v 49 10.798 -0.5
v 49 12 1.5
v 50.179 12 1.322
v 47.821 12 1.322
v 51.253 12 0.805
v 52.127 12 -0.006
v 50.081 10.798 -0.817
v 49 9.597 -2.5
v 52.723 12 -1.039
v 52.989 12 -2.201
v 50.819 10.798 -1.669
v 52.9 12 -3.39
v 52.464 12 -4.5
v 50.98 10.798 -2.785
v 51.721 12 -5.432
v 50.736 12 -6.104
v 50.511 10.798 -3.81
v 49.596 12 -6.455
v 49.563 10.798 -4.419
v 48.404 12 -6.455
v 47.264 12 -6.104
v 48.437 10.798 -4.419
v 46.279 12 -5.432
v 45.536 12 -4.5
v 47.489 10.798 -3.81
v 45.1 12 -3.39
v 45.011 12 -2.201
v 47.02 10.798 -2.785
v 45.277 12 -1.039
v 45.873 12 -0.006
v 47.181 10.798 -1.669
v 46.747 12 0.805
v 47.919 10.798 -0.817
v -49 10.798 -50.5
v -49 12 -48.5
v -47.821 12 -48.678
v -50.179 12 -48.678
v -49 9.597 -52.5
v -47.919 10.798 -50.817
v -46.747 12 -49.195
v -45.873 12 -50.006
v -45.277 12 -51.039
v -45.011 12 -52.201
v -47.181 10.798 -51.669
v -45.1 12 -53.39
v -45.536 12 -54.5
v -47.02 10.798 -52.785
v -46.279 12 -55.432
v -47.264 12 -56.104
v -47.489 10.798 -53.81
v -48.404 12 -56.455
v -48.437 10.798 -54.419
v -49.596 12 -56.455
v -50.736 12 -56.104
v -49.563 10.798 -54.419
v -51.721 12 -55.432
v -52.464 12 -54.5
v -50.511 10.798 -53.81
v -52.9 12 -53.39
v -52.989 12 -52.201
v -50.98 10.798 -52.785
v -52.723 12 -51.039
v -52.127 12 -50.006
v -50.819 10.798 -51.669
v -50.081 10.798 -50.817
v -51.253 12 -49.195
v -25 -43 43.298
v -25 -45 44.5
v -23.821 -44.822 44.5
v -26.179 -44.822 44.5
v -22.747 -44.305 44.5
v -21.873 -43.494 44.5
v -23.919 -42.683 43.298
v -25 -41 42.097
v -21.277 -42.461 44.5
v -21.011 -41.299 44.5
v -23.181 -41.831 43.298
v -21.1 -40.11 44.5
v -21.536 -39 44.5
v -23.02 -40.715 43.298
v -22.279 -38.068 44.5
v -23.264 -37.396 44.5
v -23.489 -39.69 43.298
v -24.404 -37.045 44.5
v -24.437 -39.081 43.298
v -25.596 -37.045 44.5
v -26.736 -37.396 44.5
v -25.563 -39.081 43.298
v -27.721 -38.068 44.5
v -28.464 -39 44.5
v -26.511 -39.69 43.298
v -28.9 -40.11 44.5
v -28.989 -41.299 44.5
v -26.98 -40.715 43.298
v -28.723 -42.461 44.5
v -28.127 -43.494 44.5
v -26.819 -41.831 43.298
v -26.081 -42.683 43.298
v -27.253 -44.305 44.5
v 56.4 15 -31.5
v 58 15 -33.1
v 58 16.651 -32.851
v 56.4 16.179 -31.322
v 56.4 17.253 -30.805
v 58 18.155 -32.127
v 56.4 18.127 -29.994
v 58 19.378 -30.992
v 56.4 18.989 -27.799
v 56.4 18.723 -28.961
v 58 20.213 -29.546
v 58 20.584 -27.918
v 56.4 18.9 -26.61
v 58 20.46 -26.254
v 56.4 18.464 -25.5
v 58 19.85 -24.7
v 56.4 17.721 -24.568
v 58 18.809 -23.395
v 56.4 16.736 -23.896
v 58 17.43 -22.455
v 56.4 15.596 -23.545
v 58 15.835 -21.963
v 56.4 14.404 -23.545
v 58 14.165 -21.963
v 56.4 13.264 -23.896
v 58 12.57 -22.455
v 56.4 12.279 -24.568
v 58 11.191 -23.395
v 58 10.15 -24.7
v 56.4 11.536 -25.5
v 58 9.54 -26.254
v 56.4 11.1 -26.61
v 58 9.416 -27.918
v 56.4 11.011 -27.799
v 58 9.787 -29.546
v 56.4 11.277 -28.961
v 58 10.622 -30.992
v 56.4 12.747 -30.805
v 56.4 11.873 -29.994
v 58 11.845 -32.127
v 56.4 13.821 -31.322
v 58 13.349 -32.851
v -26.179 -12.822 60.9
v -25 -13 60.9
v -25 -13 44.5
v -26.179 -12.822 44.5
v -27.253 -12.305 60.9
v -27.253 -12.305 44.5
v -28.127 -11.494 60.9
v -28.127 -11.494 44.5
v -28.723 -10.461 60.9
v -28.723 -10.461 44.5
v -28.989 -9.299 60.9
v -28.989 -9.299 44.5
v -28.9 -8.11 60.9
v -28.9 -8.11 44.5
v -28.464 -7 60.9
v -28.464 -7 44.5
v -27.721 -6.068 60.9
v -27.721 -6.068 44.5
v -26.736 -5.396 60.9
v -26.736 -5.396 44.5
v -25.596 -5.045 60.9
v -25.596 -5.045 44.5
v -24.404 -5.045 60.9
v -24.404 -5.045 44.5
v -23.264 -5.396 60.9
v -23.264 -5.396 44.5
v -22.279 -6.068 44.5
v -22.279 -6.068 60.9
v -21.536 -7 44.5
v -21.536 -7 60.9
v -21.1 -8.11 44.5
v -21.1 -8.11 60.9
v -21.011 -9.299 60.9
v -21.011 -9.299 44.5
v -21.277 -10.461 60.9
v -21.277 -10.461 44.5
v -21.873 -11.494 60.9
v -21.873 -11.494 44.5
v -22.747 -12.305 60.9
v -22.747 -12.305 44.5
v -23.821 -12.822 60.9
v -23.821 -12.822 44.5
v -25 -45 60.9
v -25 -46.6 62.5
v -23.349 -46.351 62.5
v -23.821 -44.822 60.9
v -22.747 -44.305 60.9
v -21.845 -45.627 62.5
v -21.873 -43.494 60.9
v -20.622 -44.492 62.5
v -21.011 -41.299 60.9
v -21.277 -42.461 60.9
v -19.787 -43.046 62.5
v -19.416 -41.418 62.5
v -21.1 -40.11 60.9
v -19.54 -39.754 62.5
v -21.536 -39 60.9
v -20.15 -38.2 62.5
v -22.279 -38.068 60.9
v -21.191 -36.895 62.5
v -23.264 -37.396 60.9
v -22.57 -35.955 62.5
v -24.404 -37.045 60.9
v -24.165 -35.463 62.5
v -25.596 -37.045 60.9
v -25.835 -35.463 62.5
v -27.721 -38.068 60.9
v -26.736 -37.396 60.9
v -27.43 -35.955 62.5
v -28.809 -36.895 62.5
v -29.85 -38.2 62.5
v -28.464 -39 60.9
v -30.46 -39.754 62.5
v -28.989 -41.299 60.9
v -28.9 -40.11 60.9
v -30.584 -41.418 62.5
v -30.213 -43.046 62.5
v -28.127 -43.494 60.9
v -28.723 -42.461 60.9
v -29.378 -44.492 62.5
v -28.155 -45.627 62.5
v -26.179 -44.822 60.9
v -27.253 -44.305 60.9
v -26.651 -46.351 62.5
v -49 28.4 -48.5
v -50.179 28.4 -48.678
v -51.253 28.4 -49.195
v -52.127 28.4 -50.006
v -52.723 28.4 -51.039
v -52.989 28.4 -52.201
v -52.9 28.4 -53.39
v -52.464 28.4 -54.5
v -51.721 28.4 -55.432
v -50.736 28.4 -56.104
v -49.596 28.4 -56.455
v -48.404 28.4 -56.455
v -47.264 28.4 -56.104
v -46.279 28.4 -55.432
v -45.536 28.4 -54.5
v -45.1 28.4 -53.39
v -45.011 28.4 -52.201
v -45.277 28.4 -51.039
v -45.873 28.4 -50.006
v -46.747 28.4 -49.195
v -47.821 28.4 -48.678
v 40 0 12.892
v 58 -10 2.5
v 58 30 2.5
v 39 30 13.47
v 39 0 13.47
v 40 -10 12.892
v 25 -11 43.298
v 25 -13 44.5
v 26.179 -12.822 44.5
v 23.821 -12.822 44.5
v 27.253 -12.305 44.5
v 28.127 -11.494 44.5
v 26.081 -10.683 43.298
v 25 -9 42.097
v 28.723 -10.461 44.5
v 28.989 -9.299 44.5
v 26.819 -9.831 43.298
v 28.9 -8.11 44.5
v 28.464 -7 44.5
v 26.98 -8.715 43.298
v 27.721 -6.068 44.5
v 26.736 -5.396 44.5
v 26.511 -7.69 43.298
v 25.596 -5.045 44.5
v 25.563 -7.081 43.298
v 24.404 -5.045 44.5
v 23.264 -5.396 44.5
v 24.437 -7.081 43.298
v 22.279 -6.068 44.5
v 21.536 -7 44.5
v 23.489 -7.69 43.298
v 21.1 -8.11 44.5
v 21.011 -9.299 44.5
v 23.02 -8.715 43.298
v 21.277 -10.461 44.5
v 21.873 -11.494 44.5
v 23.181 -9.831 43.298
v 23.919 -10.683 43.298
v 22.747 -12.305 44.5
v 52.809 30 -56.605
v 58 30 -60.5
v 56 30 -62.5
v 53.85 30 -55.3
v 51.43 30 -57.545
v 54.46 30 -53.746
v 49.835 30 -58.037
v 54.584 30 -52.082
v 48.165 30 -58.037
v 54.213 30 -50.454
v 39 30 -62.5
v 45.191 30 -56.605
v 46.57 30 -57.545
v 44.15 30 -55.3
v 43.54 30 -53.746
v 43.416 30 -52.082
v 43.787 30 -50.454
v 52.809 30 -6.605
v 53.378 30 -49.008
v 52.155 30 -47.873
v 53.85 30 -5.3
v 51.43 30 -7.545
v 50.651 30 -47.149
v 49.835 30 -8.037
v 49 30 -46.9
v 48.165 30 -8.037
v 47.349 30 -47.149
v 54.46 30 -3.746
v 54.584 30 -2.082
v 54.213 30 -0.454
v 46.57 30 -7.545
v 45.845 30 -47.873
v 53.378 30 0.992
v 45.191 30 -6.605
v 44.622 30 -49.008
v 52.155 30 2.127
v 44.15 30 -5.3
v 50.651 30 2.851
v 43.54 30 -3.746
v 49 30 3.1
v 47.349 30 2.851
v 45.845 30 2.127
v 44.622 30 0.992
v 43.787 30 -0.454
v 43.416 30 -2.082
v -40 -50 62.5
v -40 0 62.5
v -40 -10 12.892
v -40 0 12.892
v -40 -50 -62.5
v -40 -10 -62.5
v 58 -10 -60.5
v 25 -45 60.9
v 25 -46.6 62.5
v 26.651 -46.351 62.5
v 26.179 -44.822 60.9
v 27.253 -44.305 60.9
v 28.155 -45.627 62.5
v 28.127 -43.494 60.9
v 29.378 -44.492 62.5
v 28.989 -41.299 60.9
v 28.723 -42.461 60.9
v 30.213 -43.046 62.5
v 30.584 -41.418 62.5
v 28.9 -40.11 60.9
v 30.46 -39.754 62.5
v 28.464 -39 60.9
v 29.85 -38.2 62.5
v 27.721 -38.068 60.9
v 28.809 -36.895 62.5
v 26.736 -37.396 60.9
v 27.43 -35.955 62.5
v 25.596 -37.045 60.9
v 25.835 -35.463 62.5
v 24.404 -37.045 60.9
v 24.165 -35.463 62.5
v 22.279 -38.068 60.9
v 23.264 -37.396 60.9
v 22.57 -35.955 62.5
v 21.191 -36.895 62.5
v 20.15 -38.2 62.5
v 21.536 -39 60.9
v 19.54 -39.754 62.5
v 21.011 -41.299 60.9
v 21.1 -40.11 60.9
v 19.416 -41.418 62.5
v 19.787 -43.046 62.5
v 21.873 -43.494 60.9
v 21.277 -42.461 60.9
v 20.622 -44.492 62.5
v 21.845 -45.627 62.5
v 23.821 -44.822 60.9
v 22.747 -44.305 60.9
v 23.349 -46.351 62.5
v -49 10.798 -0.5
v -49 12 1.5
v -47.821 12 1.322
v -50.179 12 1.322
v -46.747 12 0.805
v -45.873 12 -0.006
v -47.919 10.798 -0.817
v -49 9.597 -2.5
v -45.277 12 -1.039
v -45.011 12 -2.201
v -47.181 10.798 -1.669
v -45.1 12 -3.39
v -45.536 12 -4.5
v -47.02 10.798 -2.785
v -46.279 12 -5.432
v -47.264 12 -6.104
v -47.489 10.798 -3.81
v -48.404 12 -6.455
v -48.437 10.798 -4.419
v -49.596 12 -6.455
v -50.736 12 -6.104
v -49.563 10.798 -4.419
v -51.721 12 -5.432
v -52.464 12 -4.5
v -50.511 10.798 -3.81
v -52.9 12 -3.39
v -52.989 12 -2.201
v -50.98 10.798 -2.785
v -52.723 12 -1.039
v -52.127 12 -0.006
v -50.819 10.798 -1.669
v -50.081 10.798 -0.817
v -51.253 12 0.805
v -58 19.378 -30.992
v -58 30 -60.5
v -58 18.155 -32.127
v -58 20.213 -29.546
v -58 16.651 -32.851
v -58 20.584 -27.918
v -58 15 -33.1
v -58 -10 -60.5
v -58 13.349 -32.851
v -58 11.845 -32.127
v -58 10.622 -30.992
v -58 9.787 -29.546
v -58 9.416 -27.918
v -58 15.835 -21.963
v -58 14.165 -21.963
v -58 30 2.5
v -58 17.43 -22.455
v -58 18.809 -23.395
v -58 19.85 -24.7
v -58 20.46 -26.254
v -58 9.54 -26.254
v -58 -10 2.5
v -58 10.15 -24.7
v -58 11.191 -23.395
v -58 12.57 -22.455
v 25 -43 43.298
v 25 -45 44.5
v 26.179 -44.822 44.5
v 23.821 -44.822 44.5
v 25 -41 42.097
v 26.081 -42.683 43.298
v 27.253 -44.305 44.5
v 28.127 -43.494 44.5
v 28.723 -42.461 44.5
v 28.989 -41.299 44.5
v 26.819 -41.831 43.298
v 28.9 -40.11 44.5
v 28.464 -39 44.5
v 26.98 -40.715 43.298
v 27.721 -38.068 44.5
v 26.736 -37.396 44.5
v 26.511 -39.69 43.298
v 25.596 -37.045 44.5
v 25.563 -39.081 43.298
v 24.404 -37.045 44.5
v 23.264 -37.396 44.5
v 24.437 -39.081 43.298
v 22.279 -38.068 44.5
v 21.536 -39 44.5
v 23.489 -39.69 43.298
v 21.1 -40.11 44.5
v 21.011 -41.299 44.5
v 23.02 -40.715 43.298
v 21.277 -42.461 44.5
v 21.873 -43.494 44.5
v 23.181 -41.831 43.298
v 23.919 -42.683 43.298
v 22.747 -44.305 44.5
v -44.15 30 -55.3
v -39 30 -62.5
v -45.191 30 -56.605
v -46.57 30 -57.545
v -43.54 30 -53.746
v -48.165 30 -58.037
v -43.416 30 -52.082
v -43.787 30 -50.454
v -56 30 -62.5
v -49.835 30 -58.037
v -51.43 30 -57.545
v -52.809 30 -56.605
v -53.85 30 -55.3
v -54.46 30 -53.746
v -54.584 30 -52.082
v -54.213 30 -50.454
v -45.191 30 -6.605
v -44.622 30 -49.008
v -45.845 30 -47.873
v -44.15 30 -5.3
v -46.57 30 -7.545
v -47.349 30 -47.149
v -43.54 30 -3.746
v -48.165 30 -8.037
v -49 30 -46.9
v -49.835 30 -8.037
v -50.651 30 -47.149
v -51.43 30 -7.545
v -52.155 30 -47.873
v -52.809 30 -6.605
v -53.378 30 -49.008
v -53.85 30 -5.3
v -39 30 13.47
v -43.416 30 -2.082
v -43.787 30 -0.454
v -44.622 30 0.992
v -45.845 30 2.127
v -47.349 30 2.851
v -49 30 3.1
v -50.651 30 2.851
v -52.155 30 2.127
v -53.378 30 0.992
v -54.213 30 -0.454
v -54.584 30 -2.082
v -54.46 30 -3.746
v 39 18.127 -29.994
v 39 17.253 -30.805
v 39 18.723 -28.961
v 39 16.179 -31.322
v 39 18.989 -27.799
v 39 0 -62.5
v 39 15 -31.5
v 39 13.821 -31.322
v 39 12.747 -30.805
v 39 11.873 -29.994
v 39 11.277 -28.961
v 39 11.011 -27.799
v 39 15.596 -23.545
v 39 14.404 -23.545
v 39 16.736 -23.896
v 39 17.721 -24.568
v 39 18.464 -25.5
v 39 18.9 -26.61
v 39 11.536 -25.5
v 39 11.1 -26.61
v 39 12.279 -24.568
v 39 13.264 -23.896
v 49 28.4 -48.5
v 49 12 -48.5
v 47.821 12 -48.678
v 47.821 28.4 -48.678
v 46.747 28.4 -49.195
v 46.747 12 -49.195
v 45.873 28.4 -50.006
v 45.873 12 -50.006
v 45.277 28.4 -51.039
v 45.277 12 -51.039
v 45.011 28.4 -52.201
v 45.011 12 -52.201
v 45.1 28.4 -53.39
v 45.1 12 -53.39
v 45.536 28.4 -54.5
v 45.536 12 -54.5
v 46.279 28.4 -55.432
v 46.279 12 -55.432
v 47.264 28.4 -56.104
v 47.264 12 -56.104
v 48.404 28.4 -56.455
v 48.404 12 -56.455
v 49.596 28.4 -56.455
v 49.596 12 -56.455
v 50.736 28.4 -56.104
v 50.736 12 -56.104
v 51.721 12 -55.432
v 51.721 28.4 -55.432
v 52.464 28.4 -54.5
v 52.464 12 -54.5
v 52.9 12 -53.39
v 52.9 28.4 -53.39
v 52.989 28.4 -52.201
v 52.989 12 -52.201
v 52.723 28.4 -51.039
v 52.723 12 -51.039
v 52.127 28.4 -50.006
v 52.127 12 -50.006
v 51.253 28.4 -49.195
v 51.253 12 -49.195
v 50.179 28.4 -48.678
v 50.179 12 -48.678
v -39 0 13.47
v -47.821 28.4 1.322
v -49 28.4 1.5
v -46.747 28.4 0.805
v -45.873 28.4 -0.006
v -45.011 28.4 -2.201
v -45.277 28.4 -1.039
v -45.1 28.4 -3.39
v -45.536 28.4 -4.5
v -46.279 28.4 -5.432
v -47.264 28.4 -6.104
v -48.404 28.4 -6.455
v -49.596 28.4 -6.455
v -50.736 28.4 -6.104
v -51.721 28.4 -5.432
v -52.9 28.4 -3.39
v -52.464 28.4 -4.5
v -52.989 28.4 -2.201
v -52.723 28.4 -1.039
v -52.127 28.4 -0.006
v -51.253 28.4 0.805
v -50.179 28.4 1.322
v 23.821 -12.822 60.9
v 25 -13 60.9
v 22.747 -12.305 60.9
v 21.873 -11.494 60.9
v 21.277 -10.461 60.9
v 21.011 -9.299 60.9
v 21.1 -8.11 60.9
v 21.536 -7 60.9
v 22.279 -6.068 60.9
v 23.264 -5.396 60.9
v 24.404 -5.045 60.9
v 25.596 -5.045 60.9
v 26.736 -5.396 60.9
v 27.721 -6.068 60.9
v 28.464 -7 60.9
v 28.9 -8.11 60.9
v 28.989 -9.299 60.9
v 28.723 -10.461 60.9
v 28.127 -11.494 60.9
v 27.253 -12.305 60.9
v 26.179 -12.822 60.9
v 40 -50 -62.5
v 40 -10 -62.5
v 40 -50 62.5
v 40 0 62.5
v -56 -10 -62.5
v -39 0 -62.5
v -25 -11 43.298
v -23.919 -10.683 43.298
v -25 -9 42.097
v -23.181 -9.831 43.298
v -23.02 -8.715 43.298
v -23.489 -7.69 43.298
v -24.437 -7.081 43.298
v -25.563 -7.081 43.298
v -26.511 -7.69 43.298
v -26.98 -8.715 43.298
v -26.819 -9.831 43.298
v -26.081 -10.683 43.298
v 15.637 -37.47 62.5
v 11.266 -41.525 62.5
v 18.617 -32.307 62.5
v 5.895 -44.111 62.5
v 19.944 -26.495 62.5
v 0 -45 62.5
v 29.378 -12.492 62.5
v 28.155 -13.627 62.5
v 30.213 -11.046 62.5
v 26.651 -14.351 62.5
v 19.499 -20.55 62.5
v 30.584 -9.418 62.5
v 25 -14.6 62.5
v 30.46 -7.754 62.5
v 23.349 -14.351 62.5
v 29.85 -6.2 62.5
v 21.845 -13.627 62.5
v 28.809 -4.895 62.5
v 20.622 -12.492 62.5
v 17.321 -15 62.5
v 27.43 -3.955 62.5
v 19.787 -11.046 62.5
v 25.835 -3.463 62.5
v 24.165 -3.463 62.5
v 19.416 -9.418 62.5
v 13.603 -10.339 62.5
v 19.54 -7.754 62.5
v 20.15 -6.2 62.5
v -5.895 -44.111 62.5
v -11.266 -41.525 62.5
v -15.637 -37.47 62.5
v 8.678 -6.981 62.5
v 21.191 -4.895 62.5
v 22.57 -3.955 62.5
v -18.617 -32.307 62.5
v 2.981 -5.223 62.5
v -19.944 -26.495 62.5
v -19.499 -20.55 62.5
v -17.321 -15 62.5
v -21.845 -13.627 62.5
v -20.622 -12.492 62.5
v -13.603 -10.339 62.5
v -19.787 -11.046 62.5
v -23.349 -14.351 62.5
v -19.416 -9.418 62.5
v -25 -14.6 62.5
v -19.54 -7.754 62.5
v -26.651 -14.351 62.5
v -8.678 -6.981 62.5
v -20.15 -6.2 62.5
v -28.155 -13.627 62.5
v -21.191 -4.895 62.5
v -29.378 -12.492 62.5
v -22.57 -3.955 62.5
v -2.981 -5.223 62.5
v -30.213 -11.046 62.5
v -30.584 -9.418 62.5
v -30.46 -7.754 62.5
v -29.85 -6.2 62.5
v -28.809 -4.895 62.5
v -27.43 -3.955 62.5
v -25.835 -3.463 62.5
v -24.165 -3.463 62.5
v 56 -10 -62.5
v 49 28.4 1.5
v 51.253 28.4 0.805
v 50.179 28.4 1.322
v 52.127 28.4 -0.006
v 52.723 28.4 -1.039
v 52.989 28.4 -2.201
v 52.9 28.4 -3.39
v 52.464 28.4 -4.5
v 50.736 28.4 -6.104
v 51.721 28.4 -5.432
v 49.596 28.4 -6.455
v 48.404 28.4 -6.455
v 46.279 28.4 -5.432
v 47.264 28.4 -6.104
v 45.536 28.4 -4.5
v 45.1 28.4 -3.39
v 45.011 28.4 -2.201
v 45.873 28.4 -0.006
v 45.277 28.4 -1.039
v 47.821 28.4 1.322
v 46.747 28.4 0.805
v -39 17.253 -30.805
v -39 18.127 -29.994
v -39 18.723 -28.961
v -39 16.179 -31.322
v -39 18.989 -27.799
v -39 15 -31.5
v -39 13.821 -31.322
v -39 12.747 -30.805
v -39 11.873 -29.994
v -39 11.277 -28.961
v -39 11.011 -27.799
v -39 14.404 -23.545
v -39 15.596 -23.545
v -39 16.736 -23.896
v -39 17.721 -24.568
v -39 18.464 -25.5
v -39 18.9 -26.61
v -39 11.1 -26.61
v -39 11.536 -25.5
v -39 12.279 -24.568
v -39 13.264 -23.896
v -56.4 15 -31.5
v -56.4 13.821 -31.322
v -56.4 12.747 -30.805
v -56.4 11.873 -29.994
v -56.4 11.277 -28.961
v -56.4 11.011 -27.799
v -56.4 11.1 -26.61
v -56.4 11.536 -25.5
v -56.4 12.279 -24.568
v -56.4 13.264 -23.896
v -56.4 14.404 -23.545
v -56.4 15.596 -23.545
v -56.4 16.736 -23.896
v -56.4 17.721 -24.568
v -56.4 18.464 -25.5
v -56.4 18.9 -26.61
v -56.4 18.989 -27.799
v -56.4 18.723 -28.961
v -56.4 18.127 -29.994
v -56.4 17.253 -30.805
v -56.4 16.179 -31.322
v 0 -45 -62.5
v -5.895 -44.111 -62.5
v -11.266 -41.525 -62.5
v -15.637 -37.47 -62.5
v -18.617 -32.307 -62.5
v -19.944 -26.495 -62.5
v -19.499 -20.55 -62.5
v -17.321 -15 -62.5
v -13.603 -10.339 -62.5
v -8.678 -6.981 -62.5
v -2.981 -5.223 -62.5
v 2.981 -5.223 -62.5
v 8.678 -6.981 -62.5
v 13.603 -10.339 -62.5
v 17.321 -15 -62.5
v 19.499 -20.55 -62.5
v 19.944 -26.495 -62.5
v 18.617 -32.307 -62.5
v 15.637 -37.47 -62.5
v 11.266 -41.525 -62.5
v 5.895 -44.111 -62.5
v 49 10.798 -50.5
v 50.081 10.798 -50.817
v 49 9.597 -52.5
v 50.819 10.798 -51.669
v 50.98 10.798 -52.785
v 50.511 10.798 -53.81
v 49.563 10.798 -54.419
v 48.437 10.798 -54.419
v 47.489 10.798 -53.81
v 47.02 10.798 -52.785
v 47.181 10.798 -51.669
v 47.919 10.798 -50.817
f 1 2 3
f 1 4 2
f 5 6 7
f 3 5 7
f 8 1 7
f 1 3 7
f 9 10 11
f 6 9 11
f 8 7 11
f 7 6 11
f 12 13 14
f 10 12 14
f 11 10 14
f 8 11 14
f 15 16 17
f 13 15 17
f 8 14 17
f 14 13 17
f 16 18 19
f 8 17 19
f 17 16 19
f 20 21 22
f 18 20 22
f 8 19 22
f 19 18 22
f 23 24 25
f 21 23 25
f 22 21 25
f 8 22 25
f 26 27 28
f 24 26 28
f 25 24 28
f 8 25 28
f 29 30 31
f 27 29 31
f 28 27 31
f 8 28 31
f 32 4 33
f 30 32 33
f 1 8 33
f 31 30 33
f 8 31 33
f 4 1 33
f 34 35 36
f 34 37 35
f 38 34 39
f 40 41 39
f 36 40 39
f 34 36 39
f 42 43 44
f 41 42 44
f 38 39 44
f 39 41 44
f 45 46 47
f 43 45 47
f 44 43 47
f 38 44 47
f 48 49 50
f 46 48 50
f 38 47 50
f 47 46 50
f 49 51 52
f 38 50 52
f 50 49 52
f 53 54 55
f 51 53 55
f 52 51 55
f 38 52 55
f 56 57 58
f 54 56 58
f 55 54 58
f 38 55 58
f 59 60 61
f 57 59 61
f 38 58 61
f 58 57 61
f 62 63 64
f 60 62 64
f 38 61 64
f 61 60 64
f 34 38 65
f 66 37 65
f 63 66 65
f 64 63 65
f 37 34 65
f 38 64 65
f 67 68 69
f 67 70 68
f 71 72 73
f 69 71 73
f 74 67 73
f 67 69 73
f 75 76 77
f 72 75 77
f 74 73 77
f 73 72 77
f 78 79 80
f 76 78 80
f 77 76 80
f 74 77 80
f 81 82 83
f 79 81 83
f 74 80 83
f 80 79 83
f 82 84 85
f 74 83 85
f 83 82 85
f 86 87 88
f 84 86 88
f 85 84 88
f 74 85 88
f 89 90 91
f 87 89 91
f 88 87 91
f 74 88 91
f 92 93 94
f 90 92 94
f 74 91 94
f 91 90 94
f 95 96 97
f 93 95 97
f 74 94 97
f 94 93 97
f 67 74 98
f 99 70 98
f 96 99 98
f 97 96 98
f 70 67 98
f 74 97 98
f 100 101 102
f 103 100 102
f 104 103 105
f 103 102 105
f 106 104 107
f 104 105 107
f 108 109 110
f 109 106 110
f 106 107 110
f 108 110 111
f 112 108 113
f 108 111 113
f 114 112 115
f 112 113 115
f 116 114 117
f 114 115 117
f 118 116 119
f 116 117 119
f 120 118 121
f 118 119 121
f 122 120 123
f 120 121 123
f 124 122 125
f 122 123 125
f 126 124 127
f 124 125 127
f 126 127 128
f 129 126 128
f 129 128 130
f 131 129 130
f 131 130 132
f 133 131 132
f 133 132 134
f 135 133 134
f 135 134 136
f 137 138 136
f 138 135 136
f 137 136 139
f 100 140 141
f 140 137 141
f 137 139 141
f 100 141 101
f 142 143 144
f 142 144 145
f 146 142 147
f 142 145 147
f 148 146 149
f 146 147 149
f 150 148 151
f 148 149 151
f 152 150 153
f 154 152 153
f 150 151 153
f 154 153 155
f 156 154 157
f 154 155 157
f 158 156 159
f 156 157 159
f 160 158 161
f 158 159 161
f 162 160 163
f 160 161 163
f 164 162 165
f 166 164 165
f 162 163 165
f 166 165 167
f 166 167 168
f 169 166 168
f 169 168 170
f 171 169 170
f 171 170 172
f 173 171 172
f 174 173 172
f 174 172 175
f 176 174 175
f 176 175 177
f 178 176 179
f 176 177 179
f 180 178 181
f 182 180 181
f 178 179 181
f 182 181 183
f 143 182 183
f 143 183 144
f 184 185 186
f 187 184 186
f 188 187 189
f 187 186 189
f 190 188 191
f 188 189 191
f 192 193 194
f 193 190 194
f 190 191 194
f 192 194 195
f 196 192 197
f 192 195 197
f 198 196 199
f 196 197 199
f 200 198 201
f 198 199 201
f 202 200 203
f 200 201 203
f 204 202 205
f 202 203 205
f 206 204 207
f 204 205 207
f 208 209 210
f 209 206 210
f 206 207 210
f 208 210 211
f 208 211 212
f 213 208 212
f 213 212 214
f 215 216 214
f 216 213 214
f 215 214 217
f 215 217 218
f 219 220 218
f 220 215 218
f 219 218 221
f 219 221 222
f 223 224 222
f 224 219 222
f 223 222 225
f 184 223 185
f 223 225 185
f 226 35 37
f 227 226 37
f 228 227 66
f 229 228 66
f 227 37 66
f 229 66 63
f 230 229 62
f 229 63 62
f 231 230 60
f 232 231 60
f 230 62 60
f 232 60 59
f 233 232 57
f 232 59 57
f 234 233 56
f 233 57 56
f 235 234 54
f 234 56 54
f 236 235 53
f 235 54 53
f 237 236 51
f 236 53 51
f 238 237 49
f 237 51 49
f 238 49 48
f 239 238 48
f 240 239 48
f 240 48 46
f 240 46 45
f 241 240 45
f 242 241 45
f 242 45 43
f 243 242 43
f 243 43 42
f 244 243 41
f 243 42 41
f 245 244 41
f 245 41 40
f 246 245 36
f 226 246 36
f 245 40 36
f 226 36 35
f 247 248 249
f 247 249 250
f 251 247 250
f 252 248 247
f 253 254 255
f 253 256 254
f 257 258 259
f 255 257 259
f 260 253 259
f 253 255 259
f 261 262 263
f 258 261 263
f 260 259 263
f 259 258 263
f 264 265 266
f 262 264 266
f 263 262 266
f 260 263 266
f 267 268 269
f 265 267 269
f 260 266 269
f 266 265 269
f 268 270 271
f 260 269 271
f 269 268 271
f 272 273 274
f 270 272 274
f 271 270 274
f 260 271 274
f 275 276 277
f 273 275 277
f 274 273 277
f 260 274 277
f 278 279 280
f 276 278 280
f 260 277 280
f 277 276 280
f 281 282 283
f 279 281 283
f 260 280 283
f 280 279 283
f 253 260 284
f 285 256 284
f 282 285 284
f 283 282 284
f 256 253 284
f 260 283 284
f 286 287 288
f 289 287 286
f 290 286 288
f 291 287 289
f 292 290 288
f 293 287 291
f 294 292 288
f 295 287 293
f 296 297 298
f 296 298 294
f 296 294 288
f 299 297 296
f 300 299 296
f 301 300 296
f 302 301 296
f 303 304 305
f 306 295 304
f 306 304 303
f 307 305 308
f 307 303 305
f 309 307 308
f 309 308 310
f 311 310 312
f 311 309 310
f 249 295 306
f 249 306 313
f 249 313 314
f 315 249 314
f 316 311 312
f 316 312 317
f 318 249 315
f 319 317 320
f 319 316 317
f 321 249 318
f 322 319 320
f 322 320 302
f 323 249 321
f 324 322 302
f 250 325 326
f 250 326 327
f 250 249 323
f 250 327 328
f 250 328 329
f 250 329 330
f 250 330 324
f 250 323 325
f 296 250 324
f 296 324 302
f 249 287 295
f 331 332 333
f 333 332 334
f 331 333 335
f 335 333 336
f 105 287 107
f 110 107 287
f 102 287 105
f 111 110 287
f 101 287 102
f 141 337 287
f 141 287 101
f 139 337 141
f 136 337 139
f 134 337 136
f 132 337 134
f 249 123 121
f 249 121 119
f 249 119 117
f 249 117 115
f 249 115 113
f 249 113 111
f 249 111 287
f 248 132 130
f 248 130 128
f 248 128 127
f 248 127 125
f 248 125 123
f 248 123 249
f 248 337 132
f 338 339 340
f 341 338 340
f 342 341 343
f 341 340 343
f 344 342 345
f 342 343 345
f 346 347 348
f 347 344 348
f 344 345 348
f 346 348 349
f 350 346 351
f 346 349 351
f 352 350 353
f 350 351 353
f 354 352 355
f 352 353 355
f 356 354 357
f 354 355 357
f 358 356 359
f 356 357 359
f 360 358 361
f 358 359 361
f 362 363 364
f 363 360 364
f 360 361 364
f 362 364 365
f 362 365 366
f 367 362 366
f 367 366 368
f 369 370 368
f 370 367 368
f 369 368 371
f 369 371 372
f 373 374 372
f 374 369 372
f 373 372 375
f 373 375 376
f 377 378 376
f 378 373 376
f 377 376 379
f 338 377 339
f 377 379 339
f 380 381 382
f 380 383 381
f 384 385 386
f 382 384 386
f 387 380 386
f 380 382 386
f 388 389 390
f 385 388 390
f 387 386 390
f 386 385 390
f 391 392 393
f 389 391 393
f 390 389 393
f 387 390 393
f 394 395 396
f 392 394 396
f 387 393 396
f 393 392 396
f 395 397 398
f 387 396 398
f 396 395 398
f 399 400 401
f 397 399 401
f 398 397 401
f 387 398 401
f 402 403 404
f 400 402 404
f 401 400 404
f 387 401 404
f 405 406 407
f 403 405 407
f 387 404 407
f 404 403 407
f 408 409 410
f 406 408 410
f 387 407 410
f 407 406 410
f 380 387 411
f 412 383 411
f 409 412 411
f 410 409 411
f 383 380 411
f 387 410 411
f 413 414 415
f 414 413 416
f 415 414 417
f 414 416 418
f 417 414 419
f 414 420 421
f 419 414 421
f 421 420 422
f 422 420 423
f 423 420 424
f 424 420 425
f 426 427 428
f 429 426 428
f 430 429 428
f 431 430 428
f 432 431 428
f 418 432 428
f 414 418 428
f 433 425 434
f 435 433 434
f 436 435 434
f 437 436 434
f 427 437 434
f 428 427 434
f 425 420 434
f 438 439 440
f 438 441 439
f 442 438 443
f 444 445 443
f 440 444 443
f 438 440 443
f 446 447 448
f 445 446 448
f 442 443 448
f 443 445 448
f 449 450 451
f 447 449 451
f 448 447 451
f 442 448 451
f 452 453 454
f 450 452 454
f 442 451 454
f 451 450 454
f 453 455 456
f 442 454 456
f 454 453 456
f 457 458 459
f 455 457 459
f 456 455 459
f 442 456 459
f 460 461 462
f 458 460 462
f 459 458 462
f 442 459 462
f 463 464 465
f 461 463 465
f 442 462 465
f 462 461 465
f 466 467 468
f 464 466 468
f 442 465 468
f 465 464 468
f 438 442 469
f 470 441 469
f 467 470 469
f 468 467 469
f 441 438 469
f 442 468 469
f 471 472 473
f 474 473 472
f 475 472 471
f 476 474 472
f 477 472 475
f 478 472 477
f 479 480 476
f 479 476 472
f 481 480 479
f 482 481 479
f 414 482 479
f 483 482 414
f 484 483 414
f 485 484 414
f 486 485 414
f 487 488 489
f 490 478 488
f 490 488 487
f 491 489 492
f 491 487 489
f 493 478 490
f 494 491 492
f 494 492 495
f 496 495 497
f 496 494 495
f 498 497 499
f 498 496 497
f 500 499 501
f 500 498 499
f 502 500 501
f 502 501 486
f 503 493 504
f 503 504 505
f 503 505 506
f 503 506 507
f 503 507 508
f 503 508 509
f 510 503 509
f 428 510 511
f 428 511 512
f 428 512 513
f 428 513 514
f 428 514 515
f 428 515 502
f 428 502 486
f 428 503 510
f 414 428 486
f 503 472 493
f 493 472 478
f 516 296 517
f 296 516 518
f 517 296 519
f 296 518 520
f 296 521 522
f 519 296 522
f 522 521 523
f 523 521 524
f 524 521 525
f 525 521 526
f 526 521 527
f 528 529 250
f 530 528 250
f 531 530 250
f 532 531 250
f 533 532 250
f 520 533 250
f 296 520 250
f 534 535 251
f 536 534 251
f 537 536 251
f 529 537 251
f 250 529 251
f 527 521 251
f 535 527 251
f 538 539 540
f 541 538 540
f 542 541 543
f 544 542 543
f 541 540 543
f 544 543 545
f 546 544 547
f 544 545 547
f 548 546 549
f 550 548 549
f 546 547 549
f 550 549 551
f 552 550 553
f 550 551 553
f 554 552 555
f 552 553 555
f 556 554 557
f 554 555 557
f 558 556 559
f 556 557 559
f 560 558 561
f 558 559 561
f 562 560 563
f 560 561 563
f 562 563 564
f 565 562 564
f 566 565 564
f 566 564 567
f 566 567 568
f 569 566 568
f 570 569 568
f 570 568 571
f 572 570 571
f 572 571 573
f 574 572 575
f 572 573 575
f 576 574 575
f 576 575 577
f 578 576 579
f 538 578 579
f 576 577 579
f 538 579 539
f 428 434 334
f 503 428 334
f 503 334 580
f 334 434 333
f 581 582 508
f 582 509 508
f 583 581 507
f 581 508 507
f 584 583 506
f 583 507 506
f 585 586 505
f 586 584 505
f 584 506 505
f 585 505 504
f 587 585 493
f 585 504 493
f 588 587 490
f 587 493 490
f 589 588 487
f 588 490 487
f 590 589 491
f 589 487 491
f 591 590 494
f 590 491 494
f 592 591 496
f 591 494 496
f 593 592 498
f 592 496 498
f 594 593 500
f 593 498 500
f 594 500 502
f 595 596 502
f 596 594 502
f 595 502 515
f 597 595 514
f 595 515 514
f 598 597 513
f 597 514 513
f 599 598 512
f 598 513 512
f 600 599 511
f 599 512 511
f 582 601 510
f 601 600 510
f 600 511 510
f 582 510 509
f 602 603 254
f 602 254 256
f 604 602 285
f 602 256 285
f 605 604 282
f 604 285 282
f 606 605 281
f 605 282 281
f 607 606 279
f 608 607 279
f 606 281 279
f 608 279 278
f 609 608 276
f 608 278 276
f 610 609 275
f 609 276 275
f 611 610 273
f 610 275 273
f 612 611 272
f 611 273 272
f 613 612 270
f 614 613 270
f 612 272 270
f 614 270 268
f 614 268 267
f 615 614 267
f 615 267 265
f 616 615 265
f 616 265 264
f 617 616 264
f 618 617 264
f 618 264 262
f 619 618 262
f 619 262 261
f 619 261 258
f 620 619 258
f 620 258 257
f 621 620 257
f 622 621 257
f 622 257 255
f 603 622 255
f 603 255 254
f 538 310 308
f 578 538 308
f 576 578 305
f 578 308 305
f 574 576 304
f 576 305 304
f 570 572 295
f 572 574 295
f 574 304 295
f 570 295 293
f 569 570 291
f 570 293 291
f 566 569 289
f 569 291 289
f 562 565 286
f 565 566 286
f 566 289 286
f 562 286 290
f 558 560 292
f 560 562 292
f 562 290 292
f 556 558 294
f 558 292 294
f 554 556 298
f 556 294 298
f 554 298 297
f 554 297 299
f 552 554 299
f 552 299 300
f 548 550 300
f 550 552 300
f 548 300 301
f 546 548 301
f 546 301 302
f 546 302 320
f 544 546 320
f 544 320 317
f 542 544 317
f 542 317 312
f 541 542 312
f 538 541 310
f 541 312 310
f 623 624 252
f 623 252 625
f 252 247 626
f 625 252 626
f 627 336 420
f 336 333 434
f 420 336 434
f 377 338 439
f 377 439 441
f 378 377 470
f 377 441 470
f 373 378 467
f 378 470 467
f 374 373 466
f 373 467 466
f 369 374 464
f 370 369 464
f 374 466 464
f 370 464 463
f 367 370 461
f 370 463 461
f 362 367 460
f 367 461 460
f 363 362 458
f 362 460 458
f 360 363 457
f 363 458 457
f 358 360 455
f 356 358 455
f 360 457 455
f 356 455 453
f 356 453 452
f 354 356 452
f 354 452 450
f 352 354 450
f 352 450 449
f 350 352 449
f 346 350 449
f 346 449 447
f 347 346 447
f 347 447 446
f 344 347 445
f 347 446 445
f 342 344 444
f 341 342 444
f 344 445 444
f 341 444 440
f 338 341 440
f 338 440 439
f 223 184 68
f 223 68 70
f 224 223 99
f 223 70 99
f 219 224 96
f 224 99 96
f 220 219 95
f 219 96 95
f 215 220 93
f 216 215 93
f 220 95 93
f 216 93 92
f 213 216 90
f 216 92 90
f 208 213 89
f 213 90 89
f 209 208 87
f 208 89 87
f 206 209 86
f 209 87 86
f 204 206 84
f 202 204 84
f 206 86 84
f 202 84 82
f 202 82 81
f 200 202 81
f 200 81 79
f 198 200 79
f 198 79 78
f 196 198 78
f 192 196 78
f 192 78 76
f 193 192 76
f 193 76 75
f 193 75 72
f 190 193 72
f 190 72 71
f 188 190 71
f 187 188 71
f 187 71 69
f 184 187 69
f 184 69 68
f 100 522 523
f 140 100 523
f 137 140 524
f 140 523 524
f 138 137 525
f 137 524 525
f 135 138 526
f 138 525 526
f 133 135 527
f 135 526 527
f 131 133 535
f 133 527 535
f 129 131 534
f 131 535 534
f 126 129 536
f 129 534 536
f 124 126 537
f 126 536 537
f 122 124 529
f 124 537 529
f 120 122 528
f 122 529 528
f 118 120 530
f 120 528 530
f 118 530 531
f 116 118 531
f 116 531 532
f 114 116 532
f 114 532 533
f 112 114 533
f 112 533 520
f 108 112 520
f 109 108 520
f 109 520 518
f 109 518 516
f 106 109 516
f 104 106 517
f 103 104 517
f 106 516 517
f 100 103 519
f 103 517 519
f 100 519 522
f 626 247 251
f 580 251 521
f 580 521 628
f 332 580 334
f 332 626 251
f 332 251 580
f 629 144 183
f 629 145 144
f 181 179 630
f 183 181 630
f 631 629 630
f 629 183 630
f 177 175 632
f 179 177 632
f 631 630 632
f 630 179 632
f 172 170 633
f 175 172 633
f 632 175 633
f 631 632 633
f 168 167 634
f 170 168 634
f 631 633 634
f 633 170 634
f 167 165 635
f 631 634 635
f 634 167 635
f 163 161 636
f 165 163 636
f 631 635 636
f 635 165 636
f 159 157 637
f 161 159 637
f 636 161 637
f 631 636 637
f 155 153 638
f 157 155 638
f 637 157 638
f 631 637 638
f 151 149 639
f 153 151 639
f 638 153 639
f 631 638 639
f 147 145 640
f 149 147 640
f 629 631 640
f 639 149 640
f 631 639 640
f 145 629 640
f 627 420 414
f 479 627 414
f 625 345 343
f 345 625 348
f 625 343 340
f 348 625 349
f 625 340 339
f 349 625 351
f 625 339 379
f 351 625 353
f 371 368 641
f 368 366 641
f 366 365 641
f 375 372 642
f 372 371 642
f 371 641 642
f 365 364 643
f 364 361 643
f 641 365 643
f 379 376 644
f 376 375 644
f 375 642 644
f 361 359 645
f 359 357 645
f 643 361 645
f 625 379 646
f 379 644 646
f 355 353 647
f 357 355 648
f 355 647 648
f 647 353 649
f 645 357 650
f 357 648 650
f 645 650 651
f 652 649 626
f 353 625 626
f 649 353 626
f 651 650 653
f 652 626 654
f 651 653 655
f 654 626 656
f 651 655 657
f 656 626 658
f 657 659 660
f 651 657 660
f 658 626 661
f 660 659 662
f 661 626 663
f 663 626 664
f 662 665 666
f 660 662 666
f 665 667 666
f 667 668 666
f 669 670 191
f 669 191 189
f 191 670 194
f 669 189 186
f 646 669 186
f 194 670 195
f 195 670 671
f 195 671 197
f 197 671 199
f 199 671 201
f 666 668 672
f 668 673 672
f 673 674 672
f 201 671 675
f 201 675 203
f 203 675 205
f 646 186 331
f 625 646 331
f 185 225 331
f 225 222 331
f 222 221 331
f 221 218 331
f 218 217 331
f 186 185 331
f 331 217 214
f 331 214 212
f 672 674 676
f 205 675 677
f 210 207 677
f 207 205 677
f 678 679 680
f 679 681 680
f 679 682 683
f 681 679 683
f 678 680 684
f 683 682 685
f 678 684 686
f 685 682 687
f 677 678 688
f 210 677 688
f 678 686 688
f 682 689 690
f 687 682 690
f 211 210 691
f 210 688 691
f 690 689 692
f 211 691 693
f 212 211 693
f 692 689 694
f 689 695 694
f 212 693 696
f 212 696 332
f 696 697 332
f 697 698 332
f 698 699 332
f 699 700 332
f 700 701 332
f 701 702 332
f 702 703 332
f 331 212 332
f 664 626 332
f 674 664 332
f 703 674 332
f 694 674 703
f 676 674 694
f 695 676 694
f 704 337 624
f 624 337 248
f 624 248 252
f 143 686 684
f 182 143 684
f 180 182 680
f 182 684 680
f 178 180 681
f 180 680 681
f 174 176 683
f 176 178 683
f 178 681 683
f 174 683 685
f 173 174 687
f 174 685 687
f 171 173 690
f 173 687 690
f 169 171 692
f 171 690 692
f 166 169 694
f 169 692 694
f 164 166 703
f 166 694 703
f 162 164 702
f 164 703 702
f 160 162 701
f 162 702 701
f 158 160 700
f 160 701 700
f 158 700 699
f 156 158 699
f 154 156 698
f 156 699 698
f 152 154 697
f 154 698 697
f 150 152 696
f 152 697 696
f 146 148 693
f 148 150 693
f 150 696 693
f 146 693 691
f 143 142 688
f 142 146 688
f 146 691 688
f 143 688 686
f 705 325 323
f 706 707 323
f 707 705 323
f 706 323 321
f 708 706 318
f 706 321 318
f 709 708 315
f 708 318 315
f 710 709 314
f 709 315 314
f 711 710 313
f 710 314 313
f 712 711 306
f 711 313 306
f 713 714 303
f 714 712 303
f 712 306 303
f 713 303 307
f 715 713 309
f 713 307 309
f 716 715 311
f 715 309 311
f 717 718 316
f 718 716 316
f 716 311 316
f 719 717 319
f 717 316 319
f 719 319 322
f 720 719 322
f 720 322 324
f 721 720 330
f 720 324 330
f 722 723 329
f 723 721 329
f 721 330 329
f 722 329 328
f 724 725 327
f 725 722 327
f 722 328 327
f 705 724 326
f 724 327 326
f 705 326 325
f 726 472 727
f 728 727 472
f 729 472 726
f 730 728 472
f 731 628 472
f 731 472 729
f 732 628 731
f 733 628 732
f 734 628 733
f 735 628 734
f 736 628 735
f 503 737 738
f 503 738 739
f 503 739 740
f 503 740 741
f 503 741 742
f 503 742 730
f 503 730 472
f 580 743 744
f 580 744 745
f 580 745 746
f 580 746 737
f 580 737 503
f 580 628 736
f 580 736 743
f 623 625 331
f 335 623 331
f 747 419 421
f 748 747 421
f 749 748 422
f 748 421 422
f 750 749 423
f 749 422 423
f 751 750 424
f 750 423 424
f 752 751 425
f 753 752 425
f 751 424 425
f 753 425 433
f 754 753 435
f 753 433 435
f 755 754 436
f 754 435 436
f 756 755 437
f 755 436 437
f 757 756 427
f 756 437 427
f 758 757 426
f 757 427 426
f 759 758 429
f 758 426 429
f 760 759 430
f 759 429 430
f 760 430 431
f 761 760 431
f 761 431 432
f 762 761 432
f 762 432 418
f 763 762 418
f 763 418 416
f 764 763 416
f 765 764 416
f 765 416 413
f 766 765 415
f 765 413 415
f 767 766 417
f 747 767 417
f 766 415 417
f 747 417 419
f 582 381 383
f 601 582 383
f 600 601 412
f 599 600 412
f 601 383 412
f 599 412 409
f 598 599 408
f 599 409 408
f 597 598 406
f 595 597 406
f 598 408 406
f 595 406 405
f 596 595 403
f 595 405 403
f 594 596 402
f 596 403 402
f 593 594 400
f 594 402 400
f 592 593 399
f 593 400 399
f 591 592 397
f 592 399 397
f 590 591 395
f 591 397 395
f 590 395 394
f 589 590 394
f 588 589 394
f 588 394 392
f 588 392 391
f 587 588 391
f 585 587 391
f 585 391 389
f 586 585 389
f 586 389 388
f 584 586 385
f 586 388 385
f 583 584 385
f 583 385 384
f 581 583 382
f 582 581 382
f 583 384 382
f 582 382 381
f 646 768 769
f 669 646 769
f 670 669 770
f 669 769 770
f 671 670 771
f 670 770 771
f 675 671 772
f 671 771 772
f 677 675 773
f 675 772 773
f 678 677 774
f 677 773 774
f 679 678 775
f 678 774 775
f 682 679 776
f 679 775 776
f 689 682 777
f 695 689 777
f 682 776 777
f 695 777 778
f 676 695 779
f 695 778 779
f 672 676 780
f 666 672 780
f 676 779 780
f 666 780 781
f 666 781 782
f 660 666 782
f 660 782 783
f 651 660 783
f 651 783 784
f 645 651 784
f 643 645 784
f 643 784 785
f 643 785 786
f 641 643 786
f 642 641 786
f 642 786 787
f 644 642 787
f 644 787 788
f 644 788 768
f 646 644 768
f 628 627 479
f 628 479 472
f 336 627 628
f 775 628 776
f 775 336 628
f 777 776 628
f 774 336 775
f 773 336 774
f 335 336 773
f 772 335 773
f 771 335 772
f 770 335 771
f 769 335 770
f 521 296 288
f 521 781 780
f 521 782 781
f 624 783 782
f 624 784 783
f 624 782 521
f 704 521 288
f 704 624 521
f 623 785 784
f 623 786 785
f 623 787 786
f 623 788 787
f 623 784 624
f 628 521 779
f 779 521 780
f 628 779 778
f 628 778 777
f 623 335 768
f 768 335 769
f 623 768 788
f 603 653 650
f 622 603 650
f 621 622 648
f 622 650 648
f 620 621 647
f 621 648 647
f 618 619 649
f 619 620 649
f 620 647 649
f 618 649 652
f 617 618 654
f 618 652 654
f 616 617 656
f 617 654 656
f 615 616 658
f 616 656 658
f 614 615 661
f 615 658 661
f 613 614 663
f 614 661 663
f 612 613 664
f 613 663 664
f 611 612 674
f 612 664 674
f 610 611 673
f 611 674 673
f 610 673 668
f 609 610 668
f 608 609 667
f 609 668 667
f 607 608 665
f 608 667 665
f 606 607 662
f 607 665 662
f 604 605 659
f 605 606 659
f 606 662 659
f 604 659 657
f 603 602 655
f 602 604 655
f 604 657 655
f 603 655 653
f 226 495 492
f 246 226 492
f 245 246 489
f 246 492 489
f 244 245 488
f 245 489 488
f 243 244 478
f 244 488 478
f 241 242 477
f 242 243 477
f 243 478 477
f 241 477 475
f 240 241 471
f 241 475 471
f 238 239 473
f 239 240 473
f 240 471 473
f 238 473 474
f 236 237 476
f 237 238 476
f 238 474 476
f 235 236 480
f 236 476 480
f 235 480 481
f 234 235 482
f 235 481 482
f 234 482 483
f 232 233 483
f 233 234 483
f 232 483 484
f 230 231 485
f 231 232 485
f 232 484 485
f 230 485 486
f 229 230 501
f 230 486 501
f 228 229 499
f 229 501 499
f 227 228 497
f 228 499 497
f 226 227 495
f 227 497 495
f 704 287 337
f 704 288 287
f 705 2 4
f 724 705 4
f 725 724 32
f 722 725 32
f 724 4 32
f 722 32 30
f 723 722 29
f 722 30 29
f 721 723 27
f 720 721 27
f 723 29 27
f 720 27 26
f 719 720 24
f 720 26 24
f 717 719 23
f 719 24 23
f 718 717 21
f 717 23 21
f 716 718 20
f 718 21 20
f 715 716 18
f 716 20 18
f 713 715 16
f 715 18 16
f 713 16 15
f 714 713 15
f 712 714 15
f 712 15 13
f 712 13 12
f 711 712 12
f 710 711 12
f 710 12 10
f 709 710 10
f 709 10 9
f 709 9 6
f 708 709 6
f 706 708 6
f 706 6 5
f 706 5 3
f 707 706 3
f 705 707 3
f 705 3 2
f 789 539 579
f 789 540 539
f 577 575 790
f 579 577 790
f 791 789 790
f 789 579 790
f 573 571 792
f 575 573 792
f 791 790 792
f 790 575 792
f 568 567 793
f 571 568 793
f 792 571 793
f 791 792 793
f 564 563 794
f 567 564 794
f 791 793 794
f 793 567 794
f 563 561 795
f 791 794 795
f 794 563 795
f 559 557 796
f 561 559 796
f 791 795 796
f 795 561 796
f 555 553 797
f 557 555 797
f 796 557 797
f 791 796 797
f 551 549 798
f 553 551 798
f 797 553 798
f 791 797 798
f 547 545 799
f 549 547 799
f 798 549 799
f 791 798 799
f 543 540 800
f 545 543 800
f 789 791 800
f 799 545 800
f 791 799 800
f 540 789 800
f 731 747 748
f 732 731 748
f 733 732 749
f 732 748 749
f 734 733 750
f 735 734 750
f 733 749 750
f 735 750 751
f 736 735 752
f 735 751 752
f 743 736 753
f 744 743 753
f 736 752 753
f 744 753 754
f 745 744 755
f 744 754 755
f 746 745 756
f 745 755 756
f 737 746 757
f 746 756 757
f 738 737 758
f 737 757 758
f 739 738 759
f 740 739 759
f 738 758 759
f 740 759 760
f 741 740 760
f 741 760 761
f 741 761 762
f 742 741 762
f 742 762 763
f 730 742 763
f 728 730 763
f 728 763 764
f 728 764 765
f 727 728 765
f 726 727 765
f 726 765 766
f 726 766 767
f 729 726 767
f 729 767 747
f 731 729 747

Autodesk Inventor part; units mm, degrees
ref_plane "YZ Plane" through (0, 0, 0) normal (1, 0, 0) x (0, 1, 0)
ref_plane "XZ Plane" through (0, 0, 0) normal (0, 1, 0) x (-1, 0, 0)
ref_plane "XY Plane" through (0, 0, 0) normal (0, 0, 1) x (1, 0, 0)
sketch "Эскиз1" plane through (0, 0, 0) normal (0, 1, 0) x (-1, 0, 0)
  line L0 (-40, 62.5) -> (40, 62.5)
  line L1 (40, 62.5) -> (40, -62.5)
  line L2 (40, -62.5) -> (-40, -62.5)
  line L3 (-40, -62.5) -> (-40, 62.5)
  line L4 (-40, 62.5) -> (40, -62.5) construction
  line L5 (40, 62.5) -> (-40, -62.5) construction
  line L6 (0, -62.5) -> (-58, -62.5)
  line L7 (-58, -62.5) -> (-58, 2.5)
  line L8 (-58, 2.5) -> (-39, 13.4697)
  line L9 (-58, -62.5) -> (-39, -62.5)
  line L10 (-39, -62.5) -> (-39, 13.4697)
  line L11 (0, 62.5) -> (0, -62.5)
  line L12 (0, -62.5) -> (58, -62.5)
  line L13 (58, -62.5) -> (58, 2.5)
  line L14 (58, 2.5) -> (39, 13.4697)
  line L15 (39, -62.5) -> (39, 13.4697)
  point P0 (0, 0)
  point P1 (-40, 12.8923)
  point P2 (40, 12.8923)
  dimension "d0" = 80
  dimension "d1" = 125
  dimension "d2" = 58
  dimension "d3" = 65
  dimension "d4" = 120
  dimension "d5" = 19
extrude "Выдавливание1" add sketch "Эскиз1" along normal blind 30 and the other way blind 10 contours L8 L10 L2 L3 | L3 L6 L7 L8 | L14 L13 L12 L1 | L1 L2 L15 L14
extrude "Выдавливание2" add sketch "Эскиз1" against normal blind 50 contours L0 L11 L2 L10 L8 L3 | L0 L1 L14 L15 L2 L11 | L8 L10 L2 L3 | L1 L2 L15 L14
sketch "Эскиз3" plane through (0, 30, 0) normal (0, 1, 0) x (1, 0, 0)
  line L0 (39, 62.5) -> (-39, 62.5) projected
  line L1 (0, 62.5) -> (49, 62.5)
  line L2 (49, 62.5) -> (49, 52.5)
  line L3 (49, 52.5) -> (49, 2.5)
  point P0 (0, 0)
  point P1 (40, 62.5)
  point P2 (-40, 62.5)
  dimension "d15" = 49
  dimension "d16" = 10
  dimension "d17" = 50
hole "Отверстие1" at (49, 30, -2.5) at (49, 30, -52.5) direction (0, -1, 0) diameter 8 depth 18 tip angle 118
thread "Резьба1" size "M8x1.25" class "6H" standard "ANSI Metric M Profile" length 13
thread "Резьба2" size "M8x1.25" class "6H" standard "ANSI Metric M Profile" length 13
sketch "Эскиз4" plane through (0, 30, 0) normal (0, 1, 0) x (1, 0, 0)
  line L0 (39, 62.5) -> (-39, 62.5) projected
  line L1 (0, 62.5) -> (-49, 62.5)
  line L2 (-49, 62.5) -> (-49, 52.5)
  line L3 (-49, 52.5) -> (-49, 2.5)
  point P0 (0, 0)
  dimension "d29" = 49
  dimension "d30" = 10
  dimension "d31" = 50
hole "Отверстие2" at (-49, 30, -52.5) at (-49, 30, -2.5) direction (0, -1, 0) diameter 8 depth 18 tip angle 118
thread "Резьба3" size "M8x1.25" class "6H" standard "ANSI Metric M Profile" length 13
thread "Резьба4" size "M8x1.25" class "6H" standard "ANSI Metric M Profile" length 13
sketch "Эскиз5" plane through (-40, 0, 62.5) normal (0, 0, 1) x (1, 0, 0)
  line L0 (40, 0) -> (40, -50)
  line L1 (0, -50) -> (80, -50) projected
  line L2 (0, -10) -> (0, -50) projected
  line L3 (0, -25) -> (80, -25)
  line L4 (80, -10) -> (80, -50) projected
  line L5 (15, -41) -> (65, -41)
  line L6 (65, -41) -> (65, -9)
  line L7 (65, -9) -> (15, -9)
  line L8 (15, -9) -> (15, -41)
  line L9 (15, -41) -> (65, -9) construction
  line L10 (65, -41) -> (15, -9) construction
  point P0 (40, -25)
  dimension "d44" = 50
  dimension "d45" = 32
hole "Отверстие3" at (0, -25, 62.5) direction (0, 0, -1) diameter 40 end through all
hole "Отверстие4" at (25, -41, 62.5) at (-25, -41, 62.5) at (-25, -9, 62.5) at (25, -9, 62.5) direction (0, 0, -1) diameter 8 depth 18 tip angle 118
thread "Резьба5" size "M8x1.25" class "6H" standard "ANSI Metric M Profile" length 13
thread "Резьба6" size "M8x1.25" class "6H" standard "ANSI Metric M Profile" length 13
thread "Резьба7" size "M8x1.25" class "6H" standard "ANSI Metric M Profile" length 13
thread "Резьба8" size "M8x1.25" class "6H" standard "ANSI Metric M Profile" length 13
sketch "Эскиз6" plane through (58, -10, -62.5) normal (1, 0, 0) x (0, 0, -1)
  line L0 (0, 10) -> (0, 40) projected
  line L1 (0, 10) -> (0, 25)
  line L2 (0, 25) -> (-35, 25)
  point P0 (-62.5, 10)
  dimension "d69" = 15
  dimension "d70" = 35
hole "Отверстие5" at (58, 15, -27.5) direction (-1, 0, 0) diameter 8 depth 116
chamfer "Фаска1" distance 1.6 angle 45 1 edges at (-58, 15, -23.5)
chamfer "Фаска2" distance 1.6 angle 45 1 edges at (58, 15, -23.5)
chamfer "Фаска3" distance 1.6 angle 45 4 edges at (-25, -37, 62.5) (25, -37, 62.5) (-25, -5, 62.5) (25, -5, 62.5)
thread "Резьба9" size "M8x1.25" class "6H" standard "ANSI Metric M Profile" full length
chamfer "Фаска4" distance 1.6 angle 45 4 edges at (49, 30, -56.5) (49, 30, -6.5) (-49, 30, -56.5) (-49, 30, -6.5)
chamfer "Фаска5" distance 2 angle 45 2 edges at (58, 10, -62.5) (-58, 10, -62.5)
properties part number "Губка-2"
